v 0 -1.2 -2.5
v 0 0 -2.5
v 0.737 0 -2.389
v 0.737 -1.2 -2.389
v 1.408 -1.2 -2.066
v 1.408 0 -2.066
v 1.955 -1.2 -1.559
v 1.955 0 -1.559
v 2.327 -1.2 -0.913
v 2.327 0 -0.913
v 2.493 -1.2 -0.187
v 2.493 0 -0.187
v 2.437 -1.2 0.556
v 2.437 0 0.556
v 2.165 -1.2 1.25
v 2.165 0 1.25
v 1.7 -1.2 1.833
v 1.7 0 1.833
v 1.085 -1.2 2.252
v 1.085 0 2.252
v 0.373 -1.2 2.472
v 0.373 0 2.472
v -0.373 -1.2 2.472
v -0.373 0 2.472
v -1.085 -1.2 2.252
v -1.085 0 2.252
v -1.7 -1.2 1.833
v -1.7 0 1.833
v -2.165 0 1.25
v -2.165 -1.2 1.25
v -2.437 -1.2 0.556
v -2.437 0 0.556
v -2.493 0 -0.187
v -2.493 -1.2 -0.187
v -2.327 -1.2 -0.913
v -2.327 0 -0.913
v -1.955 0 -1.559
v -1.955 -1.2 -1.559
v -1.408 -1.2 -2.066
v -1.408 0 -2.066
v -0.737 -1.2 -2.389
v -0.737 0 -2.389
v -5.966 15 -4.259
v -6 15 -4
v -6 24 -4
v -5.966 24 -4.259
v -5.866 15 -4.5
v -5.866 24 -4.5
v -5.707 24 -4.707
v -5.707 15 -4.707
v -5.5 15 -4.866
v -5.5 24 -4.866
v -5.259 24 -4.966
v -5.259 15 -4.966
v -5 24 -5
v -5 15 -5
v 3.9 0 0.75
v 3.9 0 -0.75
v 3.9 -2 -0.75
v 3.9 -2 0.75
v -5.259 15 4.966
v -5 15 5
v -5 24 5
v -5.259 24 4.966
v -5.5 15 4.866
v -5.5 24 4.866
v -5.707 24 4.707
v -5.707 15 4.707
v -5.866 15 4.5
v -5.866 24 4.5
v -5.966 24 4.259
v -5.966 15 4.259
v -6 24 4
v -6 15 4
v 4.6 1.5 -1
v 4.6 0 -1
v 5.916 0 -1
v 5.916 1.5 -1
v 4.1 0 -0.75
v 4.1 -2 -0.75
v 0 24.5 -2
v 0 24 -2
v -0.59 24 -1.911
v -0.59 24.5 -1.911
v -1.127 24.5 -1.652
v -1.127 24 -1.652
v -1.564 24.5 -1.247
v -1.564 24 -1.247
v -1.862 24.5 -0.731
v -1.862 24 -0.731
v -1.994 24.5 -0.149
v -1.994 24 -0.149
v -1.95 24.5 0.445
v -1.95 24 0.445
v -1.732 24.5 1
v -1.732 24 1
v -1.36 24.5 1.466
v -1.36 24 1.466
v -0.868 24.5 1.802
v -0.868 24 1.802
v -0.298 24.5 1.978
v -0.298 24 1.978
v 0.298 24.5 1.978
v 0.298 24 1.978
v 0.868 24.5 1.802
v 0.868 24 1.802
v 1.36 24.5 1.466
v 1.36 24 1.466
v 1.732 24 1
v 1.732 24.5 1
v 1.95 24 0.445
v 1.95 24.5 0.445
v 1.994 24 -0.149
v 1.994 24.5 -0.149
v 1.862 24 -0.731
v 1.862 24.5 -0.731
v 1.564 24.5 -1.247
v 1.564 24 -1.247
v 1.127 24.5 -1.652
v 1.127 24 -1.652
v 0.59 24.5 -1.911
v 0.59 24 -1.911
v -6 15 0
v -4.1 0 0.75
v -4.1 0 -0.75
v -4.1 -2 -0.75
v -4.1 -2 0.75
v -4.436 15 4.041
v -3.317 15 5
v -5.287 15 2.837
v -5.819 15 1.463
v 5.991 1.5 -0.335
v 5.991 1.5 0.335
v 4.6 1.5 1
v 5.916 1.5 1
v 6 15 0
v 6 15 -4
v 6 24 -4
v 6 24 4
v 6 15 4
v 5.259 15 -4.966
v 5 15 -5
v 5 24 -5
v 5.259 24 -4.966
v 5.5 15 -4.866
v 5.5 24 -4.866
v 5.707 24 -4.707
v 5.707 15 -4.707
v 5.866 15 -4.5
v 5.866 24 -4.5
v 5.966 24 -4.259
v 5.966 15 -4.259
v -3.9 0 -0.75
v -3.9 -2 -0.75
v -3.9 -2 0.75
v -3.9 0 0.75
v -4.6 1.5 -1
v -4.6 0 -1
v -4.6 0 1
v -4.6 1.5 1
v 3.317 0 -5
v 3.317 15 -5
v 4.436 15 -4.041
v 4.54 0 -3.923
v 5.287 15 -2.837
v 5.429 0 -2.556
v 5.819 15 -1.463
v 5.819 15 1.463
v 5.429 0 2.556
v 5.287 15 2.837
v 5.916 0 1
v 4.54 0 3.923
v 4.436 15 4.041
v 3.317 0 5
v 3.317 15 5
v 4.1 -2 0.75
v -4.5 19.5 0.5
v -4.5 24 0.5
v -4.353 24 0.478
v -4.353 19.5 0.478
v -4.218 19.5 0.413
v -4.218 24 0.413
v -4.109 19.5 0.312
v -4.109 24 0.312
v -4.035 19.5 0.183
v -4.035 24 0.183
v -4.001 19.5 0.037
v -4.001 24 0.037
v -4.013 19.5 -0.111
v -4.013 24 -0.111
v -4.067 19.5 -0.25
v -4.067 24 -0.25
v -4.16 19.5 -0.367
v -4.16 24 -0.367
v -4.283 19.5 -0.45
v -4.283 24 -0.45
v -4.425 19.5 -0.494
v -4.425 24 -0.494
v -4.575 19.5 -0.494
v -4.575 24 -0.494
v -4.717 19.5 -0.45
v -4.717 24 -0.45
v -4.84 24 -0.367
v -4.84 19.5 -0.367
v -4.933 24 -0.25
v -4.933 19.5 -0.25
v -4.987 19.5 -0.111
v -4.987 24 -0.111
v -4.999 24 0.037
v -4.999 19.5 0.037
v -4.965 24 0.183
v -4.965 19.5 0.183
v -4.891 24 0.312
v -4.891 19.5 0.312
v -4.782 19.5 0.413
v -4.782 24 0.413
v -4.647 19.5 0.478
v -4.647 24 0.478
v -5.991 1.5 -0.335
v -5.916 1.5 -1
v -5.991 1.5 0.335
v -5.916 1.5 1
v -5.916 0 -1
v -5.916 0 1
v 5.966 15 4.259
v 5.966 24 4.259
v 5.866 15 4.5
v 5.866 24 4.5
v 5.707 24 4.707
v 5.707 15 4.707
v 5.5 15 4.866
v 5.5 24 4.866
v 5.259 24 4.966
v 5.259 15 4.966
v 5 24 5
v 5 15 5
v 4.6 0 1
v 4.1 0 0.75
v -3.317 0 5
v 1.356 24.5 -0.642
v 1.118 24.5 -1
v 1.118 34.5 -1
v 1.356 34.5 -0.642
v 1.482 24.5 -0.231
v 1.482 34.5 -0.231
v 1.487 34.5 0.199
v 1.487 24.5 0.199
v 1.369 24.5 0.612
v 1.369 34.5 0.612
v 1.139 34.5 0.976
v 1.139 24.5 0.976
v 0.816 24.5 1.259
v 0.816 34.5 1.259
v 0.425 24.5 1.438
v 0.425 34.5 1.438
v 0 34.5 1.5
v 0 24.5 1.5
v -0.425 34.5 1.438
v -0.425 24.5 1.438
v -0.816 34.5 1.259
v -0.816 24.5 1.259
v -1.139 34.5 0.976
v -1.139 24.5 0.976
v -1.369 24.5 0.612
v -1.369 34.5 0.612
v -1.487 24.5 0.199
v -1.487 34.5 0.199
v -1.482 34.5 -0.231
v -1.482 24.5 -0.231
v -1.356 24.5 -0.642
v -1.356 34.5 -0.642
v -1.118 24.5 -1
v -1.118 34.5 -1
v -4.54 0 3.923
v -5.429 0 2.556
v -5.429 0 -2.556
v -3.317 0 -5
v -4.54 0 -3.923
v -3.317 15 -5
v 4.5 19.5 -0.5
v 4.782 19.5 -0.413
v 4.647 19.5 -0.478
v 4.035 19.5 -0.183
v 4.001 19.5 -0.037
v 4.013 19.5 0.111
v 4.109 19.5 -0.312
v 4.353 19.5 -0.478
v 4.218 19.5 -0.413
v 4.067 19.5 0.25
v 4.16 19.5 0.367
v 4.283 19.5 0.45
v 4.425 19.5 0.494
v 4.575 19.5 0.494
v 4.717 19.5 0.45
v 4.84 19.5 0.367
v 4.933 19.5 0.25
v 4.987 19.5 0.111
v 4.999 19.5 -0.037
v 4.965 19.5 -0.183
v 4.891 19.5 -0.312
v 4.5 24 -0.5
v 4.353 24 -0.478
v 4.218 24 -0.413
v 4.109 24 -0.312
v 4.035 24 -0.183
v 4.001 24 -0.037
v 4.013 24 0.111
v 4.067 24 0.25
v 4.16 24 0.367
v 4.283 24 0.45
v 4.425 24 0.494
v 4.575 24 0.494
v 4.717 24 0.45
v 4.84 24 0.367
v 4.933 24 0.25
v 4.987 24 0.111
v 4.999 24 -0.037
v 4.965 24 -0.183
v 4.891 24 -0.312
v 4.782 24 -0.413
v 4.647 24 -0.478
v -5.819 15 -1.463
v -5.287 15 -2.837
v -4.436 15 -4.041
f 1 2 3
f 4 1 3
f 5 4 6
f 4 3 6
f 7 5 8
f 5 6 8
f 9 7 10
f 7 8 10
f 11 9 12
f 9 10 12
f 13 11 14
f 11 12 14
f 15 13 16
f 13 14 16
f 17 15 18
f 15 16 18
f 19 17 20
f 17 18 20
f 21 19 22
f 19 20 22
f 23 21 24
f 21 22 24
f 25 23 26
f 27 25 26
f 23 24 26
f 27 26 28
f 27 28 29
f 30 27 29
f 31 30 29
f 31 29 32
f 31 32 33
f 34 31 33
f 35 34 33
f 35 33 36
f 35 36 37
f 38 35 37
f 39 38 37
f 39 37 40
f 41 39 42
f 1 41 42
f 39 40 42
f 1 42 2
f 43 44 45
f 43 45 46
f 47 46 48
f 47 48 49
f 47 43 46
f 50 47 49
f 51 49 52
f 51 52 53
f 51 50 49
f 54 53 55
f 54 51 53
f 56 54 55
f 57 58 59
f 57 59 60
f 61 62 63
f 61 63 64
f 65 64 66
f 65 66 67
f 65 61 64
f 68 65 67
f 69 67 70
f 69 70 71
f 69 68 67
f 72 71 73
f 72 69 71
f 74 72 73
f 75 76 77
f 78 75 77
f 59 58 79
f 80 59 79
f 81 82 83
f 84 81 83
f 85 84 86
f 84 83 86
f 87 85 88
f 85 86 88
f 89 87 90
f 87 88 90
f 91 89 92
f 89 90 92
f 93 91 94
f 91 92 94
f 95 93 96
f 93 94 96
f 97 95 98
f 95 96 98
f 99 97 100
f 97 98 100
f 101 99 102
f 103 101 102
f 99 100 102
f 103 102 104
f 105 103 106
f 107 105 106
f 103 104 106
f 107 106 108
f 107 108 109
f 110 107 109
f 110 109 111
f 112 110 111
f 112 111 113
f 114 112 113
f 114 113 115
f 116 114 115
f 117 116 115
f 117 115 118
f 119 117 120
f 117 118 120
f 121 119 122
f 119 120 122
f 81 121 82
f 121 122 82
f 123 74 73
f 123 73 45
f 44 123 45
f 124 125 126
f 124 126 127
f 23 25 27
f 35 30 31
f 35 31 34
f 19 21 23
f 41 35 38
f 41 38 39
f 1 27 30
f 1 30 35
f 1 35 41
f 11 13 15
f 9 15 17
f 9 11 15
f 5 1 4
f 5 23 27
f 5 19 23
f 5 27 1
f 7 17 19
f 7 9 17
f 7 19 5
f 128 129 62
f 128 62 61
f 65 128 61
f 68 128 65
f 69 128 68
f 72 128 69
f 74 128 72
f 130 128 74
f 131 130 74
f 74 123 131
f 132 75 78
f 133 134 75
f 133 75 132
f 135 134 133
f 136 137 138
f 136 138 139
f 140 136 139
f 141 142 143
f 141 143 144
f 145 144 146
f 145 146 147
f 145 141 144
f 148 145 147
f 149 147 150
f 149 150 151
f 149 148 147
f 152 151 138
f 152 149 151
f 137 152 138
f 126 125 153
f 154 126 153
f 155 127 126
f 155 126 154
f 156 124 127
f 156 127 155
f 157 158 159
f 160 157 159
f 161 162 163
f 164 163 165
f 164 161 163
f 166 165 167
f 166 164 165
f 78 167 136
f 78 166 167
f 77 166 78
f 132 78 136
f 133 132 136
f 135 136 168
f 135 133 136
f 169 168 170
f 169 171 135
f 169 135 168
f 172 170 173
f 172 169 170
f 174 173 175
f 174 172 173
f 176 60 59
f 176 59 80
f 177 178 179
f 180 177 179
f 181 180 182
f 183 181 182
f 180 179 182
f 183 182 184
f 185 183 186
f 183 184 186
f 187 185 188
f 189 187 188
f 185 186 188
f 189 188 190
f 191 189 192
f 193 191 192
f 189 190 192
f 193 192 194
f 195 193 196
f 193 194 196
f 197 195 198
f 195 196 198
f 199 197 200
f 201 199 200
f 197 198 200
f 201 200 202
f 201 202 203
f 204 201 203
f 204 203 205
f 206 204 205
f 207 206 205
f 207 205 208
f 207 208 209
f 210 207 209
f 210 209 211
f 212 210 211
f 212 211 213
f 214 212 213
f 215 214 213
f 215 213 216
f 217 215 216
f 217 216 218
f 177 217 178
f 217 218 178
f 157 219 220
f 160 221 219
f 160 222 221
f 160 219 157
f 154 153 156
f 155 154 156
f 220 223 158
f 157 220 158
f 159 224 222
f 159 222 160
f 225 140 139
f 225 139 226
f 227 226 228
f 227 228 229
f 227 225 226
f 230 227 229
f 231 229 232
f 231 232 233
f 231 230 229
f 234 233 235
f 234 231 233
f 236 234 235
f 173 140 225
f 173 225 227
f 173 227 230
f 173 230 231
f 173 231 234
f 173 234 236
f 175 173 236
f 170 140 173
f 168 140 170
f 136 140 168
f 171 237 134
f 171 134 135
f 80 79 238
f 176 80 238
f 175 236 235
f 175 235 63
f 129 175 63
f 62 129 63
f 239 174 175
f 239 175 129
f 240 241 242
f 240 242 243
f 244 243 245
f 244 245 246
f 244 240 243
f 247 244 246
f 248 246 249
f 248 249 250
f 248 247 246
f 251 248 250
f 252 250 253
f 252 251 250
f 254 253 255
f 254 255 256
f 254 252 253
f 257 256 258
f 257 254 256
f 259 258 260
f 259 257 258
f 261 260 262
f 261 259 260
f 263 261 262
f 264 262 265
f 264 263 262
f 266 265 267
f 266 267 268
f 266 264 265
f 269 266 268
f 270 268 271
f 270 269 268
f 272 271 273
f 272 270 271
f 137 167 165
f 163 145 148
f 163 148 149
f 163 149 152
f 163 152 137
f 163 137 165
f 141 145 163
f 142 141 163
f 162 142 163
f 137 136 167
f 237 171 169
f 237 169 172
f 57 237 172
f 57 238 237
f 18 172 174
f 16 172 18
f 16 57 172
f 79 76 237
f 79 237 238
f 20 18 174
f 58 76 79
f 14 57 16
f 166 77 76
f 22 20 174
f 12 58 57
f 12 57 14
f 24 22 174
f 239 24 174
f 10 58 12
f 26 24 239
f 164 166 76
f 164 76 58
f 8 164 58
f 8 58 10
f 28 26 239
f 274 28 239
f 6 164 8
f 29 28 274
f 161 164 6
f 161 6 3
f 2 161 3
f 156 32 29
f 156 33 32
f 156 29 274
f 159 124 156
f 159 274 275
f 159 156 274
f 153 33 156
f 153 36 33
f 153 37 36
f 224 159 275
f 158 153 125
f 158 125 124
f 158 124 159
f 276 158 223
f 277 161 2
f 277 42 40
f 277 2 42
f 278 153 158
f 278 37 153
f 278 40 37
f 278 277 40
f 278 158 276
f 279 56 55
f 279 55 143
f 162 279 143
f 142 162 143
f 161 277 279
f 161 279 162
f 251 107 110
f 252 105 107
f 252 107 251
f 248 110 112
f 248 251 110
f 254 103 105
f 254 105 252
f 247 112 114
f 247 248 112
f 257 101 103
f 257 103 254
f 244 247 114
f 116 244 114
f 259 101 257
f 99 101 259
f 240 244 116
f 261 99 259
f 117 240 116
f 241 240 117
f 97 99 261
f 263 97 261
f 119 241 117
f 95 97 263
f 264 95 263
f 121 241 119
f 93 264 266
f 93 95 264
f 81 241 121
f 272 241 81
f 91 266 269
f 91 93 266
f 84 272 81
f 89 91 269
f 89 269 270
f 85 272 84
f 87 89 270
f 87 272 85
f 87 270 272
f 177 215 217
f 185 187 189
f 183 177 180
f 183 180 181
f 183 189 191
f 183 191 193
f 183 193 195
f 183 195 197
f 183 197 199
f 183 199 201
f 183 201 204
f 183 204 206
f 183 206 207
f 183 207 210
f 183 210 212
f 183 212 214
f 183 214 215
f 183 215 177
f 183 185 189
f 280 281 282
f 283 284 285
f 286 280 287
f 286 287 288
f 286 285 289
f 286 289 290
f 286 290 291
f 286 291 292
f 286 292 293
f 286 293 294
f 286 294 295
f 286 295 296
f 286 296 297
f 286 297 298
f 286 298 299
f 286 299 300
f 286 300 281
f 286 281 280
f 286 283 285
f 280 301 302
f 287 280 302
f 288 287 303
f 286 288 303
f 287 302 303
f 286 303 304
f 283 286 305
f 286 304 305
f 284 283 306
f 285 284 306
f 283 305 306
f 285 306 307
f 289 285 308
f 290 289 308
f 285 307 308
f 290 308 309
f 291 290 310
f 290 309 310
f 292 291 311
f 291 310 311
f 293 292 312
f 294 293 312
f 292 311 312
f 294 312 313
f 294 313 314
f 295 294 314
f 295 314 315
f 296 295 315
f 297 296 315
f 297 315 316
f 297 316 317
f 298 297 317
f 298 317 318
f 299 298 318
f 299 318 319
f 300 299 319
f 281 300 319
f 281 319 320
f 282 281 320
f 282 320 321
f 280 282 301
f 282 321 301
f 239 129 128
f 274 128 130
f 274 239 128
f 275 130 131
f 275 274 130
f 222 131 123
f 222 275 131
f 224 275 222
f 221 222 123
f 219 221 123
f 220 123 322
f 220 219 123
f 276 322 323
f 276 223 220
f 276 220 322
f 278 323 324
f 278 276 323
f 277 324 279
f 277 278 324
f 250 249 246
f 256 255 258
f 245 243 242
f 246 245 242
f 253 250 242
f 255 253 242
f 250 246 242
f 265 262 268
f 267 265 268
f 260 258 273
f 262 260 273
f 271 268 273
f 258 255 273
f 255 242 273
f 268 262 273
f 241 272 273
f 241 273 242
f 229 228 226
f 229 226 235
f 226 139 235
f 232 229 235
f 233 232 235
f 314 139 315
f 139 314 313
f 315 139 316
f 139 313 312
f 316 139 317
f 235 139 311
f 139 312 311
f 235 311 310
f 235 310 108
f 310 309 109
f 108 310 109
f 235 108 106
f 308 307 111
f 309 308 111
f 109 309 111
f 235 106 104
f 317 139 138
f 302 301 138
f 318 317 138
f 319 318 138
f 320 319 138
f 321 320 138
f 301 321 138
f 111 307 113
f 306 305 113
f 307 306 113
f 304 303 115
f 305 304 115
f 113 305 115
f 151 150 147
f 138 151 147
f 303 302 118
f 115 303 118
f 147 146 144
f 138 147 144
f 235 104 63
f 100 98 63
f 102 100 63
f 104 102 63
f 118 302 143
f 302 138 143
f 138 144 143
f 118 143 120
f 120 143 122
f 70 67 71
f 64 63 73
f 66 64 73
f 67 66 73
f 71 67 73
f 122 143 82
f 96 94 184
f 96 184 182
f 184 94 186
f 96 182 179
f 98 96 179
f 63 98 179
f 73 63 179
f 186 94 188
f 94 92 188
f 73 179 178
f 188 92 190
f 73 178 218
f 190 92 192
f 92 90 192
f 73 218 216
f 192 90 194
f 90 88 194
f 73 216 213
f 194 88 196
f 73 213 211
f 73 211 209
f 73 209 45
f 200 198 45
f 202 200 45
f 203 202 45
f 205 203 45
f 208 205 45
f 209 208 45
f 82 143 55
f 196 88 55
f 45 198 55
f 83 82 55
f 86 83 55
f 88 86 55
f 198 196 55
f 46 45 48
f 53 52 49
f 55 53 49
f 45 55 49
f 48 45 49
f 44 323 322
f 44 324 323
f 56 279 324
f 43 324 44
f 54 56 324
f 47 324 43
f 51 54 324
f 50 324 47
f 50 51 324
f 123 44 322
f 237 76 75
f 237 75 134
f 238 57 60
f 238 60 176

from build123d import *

# Parameters (mm, degrees)
BOSS_EXTRUDE1_DEPTH = 15
SKETCH2_R           = 2.5
BOSS_EXTRUDE2_DEPTH = 1.2
SKETCH3_W           = 0.2
SKETCH3_H           = 1.5
BOSS_EXTRUDE3_DEPTH = 2
SKETCH4_W           = 1.4
SKETCH4_H           = 2
CUT_EXTRUDE1_DEPTH  = 1.5
BOSS_EXTRUDE4_DEPTH = 9
BOSS_EXTRUDE5_DEPTH = 10.5
SKETCH7_R           = 2
BOSS_EXTRUDE6_DEPTH = 0.5
SKETCH8_R           = 0.5
CUT_EXTRUDE2_DEPTH  = 4.5


with BuildPart() as part:
    # Sketch1 → Boss-Extrude1 (new body)
    with BuildSketch(Plane(origin=(0, 0, 0), x_dir=(1, 0, 0), z_dir=(0, 1, 0))):
        with BuildLine():
            Line((-3.31662479, 5), (3.31662479, 5))
            ThreePointArc((3.31662479, 5), (6, 0), (3.31662479, -5))
            Line((3.31662479, -5), (-3.31662479, -5))
            ThreePointArc((-3.31662479, -5), (-6, 0), (-3.31662479, 5))
        make_face()
    extrude(amount=BOSS_EXTRUDE1_DEPTH)

    # Sketch2 → Boss-Extrude2 (add)
    with BuildSketch(Plane.XZ):
        with Locations(Location((0, 0, 0), (0, 0, 270))):
            Circle(SKETCH2_R)
    extrude(amount=BOSS_EXTRUDE2_DEPTH)

    # Sketch3 → Boss-Extrude3 (add)
    with BuildSketch(Plane.XZ):
        with Locations((4, 0)):
            Rectangle(SKETCH3_W, SKETCH3_H)
        with Locations((-4, 0)):
            Rectangle(SKETCH3_W, SKETCH3_H)
    extrude(amount=BOSS_EXTRUDE3_DEPTH)

    # Sketch4 → Cut-Extrude1 (cut)
    with BuildSketch(Plane.XZ):
        with Locations((-5.3, 0)):
            Rectangle(SKETCH4_W, SKETCH4_H)
        with Locations((5.3, 0)):
            Rectangle(SKETCH4_W, SKETCH4_H)
    extrude(amount=-CUT_EXTRUDE1_DEPTH, mode=Mode.SUBTRACT)

    # Sketch5 → Boss-Extrude4 (add)
    with BuildSketch(Plane(origin=(0, 15, 0), x_dir=(1, 0, 0), z_dir=(0, 1, 0))):
        with BuildLine():
            Line((-5, 5), (5, 5))
            ThreePointArc((5, 5), (5.707106781, 4.707106781), (6, 4))
            Line((6, 4), (6, -4))
            ThreePointArc((6, -4), (5.707106781, -4.707106781), (5, -5))
            Line((5, -5), (-5, -5))
            ThreePointArc((-5, -5), (-5.707106781, -4.707106781), (-6, -4))
            Line((-6, -4), (-6, 4))
            ThreePointArc((-6, 4), (-5.707106781, 4.707106781), (-5, 5))
        make_face()
    extrude(amount=BOSS_EXTRUDE4_DEPTH)

    # Sketch6 → Boss-Extrude5 (add)
    with BuildSketch(Plane(origin=(0, 24, 0), x_dir=(1, 0, 0), z_dir=(0, 1, 0))):
        with BuildLine():
            Line((-1.118033989, 1), (1.118033989, 1))
            ThreePointArc((1.118033989, 1), (0, -1.5), (-1.118033989, 1))
        make_face()
    extrude(amount=BOSS_EXTRUDE5_DEPTH)

    # Sketch7 → Boss-Extrude6 (add)
    with BuildSketch(Plane(origin=(0, 24, 0), x_dir=(1, 0, 0), z_dir=(0, 1, 0))):
        with Locations(Location((0, 0, 0), (0, 0, 90))):
            Circle(SKETCH7_R)
    extrude(amount=BOSS_EXTRUDE6_DEPTH)

    # Sketch8 → Cut-Extrude2 (cut)
    with BuildSketch(Plane(origin=(0, 24, 0), x_dir=(1, 0, 0), z_dir=(0, 1, 0))):
        with Locations(Location((-4.5, 0, 0), (0, 0, 270))):
            Circle(SKETCH8_R)
        with Locations(Location((4.5, 0, 0), (0, 0, 90))):
            Circle(SKETCH8_R)
    extrude(amount=-CUT_EXTRUDE2_DEPTH, mode=Mode.SUBTRACT)


solid = part.part
